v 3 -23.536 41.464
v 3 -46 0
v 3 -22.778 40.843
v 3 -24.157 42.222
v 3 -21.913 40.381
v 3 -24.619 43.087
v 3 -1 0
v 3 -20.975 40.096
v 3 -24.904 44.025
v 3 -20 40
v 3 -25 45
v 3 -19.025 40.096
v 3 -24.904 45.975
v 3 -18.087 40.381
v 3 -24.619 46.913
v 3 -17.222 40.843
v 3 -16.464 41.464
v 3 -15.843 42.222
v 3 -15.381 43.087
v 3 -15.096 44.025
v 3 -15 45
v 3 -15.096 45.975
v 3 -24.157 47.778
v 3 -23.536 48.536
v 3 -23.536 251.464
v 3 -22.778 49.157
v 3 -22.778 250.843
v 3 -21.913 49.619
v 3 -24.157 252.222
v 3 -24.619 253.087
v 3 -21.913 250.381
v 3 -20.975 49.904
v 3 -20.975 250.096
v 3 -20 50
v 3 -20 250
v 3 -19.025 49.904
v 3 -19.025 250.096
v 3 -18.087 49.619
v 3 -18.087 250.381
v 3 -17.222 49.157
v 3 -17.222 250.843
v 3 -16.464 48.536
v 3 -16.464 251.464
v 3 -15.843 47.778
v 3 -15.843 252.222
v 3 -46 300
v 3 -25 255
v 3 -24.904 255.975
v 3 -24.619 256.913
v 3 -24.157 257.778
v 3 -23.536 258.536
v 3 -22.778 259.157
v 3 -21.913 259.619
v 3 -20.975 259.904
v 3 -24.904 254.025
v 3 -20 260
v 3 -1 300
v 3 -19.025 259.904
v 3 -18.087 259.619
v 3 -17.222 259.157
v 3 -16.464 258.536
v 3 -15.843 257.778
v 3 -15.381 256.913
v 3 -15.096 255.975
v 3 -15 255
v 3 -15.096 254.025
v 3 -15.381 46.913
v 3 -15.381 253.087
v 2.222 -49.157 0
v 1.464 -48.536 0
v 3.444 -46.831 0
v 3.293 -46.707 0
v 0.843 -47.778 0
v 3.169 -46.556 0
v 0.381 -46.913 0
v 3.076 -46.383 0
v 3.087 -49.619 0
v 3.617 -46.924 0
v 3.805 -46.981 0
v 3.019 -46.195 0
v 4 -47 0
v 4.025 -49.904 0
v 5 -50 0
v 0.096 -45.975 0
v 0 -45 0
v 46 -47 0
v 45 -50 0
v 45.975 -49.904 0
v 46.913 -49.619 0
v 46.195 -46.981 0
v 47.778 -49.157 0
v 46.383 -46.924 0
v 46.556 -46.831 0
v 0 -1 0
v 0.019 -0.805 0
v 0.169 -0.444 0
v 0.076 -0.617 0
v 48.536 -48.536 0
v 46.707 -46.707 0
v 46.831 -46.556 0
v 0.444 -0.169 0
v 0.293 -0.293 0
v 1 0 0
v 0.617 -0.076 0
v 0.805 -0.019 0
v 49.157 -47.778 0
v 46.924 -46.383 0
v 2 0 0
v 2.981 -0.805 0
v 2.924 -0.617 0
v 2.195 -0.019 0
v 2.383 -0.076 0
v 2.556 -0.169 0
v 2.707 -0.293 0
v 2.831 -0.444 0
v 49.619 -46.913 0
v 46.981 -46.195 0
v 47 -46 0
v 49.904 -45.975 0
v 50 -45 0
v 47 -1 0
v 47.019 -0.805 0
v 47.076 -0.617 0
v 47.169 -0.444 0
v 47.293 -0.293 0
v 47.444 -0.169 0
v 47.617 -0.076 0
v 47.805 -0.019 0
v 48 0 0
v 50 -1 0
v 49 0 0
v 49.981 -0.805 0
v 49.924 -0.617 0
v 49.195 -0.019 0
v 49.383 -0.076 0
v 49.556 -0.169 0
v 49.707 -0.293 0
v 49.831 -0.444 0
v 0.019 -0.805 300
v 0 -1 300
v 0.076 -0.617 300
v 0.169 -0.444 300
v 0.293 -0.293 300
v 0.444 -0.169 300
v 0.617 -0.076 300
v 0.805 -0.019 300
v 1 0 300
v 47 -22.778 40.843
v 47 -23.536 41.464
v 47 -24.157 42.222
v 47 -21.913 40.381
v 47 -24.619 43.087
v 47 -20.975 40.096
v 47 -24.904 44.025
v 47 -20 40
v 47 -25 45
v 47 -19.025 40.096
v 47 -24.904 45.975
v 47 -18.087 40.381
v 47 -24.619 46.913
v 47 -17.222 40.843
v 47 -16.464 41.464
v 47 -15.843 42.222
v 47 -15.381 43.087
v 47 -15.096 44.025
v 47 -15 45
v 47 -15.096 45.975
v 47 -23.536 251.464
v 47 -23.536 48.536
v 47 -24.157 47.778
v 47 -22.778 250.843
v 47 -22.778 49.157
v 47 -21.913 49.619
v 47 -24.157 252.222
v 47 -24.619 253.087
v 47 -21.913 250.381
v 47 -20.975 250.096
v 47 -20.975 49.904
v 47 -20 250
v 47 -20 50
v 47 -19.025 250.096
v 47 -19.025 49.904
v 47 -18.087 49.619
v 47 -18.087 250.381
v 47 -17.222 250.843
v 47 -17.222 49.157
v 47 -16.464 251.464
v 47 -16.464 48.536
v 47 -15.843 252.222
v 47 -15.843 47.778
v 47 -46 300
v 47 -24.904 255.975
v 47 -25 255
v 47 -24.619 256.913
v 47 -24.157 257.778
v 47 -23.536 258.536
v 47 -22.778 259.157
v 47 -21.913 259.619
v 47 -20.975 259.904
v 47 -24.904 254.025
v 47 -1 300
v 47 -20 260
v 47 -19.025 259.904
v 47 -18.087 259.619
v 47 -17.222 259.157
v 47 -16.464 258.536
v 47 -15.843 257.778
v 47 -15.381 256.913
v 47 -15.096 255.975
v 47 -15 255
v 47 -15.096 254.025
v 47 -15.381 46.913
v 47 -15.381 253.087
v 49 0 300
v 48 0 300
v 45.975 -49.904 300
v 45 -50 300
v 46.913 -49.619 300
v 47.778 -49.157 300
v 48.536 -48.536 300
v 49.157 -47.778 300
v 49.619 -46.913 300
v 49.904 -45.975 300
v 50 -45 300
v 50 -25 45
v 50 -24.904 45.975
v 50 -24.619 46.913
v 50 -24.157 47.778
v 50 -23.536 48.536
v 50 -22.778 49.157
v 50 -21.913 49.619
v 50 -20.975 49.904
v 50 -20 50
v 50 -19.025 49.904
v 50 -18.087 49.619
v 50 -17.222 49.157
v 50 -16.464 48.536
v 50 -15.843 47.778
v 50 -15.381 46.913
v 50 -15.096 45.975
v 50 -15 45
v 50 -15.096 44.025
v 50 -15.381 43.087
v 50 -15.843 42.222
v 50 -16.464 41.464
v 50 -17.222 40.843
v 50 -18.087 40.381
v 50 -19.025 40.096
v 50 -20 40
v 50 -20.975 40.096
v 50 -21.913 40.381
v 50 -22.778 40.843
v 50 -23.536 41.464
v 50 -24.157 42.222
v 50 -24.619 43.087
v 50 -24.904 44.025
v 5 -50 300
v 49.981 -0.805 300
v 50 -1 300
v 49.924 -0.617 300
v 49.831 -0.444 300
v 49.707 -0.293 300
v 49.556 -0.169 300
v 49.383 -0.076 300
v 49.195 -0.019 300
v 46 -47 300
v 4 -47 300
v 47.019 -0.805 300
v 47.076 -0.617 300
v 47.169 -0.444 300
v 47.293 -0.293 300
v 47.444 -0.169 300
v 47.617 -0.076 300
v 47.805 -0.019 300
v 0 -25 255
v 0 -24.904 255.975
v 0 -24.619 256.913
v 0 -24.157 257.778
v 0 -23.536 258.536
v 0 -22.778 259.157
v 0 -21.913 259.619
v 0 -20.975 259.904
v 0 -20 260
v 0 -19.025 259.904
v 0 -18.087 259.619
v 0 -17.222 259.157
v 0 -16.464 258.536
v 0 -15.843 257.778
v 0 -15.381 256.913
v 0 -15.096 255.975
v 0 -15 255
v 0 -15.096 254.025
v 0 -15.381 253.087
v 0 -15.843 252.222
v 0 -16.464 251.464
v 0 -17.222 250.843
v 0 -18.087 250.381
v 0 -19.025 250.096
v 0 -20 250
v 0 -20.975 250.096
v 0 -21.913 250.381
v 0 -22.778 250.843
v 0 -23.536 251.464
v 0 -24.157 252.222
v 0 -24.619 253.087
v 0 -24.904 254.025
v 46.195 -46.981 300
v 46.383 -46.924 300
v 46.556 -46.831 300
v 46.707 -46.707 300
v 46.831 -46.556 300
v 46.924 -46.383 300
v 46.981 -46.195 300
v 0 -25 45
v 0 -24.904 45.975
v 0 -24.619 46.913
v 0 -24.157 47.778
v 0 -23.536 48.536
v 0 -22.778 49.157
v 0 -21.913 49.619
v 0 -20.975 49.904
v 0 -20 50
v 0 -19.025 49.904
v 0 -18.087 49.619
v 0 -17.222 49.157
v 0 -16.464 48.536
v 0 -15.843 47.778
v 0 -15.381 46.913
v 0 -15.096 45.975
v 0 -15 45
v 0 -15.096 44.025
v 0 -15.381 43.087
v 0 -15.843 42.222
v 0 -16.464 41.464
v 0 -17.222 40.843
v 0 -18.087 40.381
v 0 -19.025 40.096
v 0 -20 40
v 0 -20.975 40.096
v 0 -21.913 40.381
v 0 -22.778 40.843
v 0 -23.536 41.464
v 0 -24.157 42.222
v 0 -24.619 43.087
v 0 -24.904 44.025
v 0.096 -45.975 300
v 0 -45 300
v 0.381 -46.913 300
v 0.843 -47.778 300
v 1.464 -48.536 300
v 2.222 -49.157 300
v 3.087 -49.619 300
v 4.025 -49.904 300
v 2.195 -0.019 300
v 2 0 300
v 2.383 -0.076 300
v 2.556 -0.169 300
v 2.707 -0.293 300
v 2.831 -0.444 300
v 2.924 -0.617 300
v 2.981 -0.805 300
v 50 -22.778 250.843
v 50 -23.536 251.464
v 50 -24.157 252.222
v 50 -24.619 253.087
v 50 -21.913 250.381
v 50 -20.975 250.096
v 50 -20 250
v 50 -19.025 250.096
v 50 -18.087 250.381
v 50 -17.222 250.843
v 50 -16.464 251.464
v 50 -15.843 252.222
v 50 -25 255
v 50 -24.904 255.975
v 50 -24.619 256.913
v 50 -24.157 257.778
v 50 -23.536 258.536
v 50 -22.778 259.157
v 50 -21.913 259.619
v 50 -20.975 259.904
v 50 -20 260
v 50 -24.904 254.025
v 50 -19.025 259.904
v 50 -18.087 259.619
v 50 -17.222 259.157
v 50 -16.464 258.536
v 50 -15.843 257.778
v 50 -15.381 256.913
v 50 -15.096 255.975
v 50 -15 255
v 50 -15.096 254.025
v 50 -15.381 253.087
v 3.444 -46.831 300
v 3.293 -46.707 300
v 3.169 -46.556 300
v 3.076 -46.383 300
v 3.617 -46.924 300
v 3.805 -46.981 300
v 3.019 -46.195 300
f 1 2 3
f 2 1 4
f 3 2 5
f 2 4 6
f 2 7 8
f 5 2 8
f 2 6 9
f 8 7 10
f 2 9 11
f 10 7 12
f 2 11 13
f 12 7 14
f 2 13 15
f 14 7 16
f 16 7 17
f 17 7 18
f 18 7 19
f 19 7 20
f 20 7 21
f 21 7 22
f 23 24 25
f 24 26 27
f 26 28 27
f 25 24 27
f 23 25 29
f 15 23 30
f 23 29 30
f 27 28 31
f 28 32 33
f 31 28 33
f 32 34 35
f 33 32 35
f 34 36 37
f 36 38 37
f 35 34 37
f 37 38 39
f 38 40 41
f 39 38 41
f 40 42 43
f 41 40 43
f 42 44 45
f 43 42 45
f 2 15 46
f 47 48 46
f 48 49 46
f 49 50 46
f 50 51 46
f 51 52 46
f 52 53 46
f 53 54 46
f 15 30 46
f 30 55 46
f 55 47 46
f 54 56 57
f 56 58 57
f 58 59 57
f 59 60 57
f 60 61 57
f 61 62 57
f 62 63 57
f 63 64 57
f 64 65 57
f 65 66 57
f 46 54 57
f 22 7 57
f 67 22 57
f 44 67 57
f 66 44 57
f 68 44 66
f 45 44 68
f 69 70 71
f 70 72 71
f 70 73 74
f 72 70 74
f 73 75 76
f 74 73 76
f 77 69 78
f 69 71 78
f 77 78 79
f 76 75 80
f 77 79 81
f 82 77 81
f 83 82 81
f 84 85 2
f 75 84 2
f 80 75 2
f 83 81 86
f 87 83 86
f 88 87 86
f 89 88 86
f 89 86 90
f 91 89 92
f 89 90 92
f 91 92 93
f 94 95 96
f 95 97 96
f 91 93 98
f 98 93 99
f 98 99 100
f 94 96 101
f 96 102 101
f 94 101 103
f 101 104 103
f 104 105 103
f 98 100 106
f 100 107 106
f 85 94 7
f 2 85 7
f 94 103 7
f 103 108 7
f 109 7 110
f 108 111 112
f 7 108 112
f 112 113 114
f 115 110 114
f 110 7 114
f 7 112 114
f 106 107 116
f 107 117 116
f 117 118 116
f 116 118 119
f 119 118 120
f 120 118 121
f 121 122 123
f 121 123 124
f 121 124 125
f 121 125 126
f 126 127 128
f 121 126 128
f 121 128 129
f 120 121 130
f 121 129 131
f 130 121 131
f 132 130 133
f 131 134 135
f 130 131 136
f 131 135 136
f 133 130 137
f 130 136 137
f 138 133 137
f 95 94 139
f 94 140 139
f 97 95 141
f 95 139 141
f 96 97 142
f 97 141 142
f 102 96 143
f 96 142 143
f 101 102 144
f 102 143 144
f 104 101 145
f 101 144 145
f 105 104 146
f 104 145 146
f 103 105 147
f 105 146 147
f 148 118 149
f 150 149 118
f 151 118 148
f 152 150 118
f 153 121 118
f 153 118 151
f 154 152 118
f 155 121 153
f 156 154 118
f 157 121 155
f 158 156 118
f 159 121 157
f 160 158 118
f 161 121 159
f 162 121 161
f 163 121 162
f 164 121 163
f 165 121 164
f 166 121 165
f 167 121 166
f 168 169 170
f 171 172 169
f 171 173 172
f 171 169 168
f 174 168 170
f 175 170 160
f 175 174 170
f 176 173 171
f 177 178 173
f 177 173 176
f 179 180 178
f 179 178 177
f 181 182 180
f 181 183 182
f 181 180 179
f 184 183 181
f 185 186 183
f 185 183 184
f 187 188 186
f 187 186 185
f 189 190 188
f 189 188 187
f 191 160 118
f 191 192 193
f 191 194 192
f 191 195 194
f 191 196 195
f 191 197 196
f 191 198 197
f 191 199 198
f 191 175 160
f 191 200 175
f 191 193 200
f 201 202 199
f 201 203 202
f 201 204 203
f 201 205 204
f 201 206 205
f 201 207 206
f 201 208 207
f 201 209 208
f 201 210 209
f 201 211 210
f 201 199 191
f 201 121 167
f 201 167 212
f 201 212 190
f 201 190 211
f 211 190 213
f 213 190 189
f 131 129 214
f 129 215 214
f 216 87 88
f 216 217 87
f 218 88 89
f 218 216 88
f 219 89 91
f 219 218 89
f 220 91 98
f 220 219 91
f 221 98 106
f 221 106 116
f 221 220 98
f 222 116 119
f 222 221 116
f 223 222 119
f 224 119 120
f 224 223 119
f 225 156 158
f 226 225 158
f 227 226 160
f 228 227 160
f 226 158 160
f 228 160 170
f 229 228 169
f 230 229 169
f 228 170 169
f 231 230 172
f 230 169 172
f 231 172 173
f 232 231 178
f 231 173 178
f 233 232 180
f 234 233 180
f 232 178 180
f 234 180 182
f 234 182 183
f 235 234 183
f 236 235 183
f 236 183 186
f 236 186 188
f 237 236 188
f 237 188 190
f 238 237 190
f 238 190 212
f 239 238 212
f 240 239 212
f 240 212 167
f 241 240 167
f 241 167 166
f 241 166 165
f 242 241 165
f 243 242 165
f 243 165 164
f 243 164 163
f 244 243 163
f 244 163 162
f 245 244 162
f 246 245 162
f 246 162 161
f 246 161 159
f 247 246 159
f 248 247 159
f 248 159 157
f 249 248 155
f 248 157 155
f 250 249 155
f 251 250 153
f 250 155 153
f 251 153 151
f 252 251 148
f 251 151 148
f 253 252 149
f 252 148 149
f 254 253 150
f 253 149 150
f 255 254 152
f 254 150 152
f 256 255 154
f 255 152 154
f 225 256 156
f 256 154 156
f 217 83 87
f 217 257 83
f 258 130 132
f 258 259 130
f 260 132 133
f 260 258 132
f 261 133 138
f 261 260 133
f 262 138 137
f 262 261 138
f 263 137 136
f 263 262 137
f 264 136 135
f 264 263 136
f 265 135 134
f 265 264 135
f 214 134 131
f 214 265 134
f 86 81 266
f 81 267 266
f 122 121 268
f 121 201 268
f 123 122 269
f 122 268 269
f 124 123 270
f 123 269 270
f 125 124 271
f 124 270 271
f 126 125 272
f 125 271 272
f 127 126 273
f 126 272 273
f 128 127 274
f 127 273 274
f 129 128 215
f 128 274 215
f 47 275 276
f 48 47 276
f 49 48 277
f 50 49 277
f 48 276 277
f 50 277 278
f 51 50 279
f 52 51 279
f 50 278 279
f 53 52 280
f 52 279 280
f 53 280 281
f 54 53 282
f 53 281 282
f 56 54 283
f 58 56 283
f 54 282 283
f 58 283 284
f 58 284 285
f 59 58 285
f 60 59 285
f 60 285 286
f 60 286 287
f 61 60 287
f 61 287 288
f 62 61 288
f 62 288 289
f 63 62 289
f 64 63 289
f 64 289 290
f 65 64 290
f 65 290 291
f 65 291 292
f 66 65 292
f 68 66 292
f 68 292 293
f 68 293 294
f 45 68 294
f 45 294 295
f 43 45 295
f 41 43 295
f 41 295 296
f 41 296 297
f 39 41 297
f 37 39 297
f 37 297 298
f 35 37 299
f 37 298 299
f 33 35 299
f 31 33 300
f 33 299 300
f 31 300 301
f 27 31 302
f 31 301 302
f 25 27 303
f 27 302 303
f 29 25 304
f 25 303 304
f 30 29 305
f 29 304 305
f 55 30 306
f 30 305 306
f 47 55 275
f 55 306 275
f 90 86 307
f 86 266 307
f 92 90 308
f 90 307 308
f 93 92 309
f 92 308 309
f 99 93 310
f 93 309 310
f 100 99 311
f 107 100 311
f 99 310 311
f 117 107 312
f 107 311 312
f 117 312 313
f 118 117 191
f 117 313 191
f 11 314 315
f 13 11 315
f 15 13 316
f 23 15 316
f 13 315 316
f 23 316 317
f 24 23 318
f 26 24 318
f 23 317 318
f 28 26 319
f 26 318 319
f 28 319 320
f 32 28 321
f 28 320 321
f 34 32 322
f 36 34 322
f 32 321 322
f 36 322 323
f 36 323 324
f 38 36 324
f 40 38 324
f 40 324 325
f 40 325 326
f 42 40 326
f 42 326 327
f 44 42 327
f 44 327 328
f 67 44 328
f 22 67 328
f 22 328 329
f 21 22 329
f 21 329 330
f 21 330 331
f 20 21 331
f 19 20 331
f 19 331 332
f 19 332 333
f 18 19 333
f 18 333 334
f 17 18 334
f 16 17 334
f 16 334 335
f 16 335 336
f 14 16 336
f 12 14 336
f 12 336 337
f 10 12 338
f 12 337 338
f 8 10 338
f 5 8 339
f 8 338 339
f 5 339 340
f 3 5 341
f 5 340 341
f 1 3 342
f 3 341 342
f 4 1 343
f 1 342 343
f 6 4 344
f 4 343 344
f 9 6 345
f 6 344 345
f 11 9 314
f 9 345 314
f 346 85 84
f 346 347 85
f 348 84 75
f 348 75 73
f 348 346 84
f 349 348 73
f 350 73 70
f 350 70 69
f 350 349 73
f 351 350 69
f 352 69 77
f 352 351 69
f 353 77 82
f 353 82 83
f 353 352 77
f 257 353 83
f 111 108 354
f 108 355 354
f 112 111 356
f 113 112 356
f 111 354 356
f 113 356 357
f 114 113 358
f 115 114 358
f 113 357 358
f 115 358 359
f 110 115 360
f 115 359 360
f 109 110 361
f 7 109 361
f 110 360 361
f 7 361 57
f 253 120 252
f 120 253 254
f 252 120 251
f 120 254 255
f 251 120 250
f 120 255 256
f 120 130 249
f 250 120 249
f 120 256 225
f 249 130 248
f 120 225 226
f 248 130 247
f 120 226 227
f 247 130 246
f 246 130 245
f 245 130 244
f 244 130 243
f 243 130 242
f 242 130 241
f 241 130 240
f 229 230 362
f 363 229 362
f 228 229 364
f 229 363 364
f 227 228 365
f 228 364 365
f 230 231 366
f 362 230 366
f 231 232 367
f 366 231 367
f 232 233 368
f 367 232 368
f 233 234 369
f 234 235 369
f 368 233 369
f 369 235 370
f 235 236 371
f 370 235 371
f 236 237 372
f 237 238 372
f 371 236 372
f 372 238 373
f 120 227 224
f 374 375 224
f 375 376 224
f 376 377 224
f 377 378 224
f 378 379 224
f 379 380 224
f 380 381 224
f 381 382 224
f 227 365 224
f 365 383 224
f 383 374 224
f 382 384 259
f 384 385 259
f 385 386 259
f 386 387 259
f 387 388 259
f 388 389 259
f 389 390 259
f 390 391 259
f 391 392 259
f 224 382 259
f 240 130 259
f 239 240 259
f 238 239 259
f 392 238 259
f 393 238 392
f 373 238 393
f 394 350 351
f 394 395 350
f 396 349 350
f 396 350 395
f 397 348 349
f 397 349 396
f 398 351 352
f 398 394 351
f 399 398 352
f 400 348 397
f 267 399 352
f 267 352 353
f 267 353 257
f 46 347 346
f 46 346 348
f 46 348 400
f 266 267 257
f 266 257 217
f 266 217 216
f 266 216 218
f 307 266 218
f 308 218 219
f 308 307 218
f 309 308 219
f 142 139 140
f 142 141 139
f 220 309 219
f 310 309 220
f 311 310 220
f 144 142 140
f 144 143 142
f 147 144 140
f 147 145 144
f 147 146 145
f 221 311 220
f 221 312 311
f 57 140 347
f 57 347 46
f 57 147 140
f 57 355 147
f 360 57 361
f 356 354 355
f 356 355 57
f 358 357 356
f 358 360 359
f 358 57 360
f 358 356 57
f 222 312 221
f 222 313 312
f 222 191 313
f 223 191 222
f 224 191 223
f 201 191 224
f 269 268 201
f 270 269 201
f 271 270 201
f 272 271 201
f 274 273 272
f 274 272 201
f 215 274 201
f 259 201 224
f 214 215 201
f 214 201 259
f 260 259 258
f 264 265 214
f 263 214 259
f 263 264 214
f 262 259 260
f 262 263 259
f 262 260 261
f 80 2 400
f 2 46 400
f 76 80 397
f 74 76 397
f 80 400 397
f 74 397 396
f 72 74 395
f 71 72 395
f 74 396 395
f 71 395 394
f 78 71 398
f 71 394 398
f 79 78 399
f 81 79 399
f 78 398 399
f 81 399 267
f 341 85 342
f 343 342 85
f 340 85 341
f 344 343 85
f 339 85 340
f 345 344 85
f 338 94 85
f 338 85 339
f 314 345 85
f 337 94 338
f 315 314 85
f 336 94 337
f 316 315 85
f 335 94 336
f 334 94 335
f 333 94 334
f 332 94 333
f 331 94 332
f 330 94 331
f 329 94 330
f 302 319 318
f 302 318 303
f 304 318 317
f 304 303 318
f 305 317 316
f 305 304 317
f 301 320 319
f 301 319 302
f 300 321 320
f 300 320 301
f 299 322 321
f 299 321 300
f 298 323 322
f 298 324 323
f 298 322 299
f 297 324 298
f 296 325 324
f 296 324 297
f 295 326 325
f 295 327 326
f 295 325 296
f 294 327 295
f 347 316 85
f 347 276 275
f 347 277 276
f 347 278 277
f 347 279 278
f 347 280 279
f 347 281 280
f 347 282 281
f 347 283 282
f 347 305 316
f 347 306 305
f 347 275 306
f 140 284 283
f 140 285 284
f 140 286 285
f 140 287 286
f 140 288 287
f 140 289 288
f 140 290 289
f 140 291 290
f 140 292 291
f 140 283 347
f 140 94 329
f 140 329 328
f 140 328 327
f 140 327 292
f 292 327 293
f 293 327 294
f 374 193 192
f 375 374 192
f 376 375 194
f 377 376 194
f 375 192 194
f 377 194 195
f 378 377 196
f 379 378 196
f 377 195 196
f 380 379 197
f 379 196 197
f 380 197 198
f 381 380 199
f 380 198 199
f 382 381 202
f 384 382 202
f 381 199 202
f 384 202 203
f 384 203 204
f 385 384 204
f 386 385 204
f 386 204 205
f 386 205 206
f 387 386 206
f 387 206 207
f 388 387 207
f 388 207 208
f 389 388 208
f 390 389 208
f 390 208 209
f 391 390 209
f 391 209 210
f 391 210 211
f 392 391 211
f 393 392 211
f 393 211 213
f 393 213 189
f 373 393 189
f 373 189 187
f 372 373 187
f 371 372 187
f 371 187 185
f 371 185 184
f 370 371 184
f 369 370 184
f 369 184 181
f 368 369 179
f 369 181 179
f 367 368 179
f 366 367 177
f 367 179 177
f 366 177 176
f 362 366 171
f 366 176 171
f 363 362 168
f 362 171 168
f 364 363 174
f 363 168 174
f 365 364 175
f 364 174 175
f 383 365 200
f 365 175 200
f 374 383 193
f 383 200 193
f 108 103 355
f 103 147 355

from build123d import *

# Parameters (mm, degrees)
F0_W     = 50
F0_H     = 300
F1_DEPTH = 50
F2_T     = -3
F3_R     = 5
F4_R     = 1
F5_R     = 5
F6_DEPTH = 50.001


with BuildPart() as f1:
    # F0 (on Front) → F1 (new body)
    with BuildSketch(Plane.XZ):
        with Locations((25, 150)):
            Rectangle(F0_W, F0_H)
    extrude(amount=F1_DEPTH)

    # F2
    f2_openings = [f1.faces().sort_by_distance(p)[0] for p in [
        (25, -25, 0),
        (25, 0, 150),
        (25, -25, 300),
    ]]
    offset(amount=F2_T, openings=f2_openings)

    # F3
    f3_edges = [f1.edges().sort_by_distance(p)[0] for p in [
        (50, -50, 150),
        (0, -50, 150),
    ]]
    fillet(f3_edges, radius=F3_R)

    # F4
    f4_edges = [f1.edges().sort_by_distance(p)[0] for p in [
        (47, 0, 150),
        (50, 0, 150),
        (3, 0, 150),
        (0, 0, 150),
        (3, -47, 150),
        (47, -47, 150),
    ]]
    fillet(f4_edges, radius=F4_R)

    # F5 (on face) → F6 (cut, through all)
    with BuildSketch(Plane(origin=(0, 0, 0), x_dir=(0, -1, 0), z_dir=(-1, 0, 0))):
        with Locations((20, 255)):
            Circle(F5_R)
        with Locations((20, 45)):
            Circle(F5_R)
    extrude(amount=-F6_DEPTH, mode=Mode.SUBTRACT)


solid = f1.part
